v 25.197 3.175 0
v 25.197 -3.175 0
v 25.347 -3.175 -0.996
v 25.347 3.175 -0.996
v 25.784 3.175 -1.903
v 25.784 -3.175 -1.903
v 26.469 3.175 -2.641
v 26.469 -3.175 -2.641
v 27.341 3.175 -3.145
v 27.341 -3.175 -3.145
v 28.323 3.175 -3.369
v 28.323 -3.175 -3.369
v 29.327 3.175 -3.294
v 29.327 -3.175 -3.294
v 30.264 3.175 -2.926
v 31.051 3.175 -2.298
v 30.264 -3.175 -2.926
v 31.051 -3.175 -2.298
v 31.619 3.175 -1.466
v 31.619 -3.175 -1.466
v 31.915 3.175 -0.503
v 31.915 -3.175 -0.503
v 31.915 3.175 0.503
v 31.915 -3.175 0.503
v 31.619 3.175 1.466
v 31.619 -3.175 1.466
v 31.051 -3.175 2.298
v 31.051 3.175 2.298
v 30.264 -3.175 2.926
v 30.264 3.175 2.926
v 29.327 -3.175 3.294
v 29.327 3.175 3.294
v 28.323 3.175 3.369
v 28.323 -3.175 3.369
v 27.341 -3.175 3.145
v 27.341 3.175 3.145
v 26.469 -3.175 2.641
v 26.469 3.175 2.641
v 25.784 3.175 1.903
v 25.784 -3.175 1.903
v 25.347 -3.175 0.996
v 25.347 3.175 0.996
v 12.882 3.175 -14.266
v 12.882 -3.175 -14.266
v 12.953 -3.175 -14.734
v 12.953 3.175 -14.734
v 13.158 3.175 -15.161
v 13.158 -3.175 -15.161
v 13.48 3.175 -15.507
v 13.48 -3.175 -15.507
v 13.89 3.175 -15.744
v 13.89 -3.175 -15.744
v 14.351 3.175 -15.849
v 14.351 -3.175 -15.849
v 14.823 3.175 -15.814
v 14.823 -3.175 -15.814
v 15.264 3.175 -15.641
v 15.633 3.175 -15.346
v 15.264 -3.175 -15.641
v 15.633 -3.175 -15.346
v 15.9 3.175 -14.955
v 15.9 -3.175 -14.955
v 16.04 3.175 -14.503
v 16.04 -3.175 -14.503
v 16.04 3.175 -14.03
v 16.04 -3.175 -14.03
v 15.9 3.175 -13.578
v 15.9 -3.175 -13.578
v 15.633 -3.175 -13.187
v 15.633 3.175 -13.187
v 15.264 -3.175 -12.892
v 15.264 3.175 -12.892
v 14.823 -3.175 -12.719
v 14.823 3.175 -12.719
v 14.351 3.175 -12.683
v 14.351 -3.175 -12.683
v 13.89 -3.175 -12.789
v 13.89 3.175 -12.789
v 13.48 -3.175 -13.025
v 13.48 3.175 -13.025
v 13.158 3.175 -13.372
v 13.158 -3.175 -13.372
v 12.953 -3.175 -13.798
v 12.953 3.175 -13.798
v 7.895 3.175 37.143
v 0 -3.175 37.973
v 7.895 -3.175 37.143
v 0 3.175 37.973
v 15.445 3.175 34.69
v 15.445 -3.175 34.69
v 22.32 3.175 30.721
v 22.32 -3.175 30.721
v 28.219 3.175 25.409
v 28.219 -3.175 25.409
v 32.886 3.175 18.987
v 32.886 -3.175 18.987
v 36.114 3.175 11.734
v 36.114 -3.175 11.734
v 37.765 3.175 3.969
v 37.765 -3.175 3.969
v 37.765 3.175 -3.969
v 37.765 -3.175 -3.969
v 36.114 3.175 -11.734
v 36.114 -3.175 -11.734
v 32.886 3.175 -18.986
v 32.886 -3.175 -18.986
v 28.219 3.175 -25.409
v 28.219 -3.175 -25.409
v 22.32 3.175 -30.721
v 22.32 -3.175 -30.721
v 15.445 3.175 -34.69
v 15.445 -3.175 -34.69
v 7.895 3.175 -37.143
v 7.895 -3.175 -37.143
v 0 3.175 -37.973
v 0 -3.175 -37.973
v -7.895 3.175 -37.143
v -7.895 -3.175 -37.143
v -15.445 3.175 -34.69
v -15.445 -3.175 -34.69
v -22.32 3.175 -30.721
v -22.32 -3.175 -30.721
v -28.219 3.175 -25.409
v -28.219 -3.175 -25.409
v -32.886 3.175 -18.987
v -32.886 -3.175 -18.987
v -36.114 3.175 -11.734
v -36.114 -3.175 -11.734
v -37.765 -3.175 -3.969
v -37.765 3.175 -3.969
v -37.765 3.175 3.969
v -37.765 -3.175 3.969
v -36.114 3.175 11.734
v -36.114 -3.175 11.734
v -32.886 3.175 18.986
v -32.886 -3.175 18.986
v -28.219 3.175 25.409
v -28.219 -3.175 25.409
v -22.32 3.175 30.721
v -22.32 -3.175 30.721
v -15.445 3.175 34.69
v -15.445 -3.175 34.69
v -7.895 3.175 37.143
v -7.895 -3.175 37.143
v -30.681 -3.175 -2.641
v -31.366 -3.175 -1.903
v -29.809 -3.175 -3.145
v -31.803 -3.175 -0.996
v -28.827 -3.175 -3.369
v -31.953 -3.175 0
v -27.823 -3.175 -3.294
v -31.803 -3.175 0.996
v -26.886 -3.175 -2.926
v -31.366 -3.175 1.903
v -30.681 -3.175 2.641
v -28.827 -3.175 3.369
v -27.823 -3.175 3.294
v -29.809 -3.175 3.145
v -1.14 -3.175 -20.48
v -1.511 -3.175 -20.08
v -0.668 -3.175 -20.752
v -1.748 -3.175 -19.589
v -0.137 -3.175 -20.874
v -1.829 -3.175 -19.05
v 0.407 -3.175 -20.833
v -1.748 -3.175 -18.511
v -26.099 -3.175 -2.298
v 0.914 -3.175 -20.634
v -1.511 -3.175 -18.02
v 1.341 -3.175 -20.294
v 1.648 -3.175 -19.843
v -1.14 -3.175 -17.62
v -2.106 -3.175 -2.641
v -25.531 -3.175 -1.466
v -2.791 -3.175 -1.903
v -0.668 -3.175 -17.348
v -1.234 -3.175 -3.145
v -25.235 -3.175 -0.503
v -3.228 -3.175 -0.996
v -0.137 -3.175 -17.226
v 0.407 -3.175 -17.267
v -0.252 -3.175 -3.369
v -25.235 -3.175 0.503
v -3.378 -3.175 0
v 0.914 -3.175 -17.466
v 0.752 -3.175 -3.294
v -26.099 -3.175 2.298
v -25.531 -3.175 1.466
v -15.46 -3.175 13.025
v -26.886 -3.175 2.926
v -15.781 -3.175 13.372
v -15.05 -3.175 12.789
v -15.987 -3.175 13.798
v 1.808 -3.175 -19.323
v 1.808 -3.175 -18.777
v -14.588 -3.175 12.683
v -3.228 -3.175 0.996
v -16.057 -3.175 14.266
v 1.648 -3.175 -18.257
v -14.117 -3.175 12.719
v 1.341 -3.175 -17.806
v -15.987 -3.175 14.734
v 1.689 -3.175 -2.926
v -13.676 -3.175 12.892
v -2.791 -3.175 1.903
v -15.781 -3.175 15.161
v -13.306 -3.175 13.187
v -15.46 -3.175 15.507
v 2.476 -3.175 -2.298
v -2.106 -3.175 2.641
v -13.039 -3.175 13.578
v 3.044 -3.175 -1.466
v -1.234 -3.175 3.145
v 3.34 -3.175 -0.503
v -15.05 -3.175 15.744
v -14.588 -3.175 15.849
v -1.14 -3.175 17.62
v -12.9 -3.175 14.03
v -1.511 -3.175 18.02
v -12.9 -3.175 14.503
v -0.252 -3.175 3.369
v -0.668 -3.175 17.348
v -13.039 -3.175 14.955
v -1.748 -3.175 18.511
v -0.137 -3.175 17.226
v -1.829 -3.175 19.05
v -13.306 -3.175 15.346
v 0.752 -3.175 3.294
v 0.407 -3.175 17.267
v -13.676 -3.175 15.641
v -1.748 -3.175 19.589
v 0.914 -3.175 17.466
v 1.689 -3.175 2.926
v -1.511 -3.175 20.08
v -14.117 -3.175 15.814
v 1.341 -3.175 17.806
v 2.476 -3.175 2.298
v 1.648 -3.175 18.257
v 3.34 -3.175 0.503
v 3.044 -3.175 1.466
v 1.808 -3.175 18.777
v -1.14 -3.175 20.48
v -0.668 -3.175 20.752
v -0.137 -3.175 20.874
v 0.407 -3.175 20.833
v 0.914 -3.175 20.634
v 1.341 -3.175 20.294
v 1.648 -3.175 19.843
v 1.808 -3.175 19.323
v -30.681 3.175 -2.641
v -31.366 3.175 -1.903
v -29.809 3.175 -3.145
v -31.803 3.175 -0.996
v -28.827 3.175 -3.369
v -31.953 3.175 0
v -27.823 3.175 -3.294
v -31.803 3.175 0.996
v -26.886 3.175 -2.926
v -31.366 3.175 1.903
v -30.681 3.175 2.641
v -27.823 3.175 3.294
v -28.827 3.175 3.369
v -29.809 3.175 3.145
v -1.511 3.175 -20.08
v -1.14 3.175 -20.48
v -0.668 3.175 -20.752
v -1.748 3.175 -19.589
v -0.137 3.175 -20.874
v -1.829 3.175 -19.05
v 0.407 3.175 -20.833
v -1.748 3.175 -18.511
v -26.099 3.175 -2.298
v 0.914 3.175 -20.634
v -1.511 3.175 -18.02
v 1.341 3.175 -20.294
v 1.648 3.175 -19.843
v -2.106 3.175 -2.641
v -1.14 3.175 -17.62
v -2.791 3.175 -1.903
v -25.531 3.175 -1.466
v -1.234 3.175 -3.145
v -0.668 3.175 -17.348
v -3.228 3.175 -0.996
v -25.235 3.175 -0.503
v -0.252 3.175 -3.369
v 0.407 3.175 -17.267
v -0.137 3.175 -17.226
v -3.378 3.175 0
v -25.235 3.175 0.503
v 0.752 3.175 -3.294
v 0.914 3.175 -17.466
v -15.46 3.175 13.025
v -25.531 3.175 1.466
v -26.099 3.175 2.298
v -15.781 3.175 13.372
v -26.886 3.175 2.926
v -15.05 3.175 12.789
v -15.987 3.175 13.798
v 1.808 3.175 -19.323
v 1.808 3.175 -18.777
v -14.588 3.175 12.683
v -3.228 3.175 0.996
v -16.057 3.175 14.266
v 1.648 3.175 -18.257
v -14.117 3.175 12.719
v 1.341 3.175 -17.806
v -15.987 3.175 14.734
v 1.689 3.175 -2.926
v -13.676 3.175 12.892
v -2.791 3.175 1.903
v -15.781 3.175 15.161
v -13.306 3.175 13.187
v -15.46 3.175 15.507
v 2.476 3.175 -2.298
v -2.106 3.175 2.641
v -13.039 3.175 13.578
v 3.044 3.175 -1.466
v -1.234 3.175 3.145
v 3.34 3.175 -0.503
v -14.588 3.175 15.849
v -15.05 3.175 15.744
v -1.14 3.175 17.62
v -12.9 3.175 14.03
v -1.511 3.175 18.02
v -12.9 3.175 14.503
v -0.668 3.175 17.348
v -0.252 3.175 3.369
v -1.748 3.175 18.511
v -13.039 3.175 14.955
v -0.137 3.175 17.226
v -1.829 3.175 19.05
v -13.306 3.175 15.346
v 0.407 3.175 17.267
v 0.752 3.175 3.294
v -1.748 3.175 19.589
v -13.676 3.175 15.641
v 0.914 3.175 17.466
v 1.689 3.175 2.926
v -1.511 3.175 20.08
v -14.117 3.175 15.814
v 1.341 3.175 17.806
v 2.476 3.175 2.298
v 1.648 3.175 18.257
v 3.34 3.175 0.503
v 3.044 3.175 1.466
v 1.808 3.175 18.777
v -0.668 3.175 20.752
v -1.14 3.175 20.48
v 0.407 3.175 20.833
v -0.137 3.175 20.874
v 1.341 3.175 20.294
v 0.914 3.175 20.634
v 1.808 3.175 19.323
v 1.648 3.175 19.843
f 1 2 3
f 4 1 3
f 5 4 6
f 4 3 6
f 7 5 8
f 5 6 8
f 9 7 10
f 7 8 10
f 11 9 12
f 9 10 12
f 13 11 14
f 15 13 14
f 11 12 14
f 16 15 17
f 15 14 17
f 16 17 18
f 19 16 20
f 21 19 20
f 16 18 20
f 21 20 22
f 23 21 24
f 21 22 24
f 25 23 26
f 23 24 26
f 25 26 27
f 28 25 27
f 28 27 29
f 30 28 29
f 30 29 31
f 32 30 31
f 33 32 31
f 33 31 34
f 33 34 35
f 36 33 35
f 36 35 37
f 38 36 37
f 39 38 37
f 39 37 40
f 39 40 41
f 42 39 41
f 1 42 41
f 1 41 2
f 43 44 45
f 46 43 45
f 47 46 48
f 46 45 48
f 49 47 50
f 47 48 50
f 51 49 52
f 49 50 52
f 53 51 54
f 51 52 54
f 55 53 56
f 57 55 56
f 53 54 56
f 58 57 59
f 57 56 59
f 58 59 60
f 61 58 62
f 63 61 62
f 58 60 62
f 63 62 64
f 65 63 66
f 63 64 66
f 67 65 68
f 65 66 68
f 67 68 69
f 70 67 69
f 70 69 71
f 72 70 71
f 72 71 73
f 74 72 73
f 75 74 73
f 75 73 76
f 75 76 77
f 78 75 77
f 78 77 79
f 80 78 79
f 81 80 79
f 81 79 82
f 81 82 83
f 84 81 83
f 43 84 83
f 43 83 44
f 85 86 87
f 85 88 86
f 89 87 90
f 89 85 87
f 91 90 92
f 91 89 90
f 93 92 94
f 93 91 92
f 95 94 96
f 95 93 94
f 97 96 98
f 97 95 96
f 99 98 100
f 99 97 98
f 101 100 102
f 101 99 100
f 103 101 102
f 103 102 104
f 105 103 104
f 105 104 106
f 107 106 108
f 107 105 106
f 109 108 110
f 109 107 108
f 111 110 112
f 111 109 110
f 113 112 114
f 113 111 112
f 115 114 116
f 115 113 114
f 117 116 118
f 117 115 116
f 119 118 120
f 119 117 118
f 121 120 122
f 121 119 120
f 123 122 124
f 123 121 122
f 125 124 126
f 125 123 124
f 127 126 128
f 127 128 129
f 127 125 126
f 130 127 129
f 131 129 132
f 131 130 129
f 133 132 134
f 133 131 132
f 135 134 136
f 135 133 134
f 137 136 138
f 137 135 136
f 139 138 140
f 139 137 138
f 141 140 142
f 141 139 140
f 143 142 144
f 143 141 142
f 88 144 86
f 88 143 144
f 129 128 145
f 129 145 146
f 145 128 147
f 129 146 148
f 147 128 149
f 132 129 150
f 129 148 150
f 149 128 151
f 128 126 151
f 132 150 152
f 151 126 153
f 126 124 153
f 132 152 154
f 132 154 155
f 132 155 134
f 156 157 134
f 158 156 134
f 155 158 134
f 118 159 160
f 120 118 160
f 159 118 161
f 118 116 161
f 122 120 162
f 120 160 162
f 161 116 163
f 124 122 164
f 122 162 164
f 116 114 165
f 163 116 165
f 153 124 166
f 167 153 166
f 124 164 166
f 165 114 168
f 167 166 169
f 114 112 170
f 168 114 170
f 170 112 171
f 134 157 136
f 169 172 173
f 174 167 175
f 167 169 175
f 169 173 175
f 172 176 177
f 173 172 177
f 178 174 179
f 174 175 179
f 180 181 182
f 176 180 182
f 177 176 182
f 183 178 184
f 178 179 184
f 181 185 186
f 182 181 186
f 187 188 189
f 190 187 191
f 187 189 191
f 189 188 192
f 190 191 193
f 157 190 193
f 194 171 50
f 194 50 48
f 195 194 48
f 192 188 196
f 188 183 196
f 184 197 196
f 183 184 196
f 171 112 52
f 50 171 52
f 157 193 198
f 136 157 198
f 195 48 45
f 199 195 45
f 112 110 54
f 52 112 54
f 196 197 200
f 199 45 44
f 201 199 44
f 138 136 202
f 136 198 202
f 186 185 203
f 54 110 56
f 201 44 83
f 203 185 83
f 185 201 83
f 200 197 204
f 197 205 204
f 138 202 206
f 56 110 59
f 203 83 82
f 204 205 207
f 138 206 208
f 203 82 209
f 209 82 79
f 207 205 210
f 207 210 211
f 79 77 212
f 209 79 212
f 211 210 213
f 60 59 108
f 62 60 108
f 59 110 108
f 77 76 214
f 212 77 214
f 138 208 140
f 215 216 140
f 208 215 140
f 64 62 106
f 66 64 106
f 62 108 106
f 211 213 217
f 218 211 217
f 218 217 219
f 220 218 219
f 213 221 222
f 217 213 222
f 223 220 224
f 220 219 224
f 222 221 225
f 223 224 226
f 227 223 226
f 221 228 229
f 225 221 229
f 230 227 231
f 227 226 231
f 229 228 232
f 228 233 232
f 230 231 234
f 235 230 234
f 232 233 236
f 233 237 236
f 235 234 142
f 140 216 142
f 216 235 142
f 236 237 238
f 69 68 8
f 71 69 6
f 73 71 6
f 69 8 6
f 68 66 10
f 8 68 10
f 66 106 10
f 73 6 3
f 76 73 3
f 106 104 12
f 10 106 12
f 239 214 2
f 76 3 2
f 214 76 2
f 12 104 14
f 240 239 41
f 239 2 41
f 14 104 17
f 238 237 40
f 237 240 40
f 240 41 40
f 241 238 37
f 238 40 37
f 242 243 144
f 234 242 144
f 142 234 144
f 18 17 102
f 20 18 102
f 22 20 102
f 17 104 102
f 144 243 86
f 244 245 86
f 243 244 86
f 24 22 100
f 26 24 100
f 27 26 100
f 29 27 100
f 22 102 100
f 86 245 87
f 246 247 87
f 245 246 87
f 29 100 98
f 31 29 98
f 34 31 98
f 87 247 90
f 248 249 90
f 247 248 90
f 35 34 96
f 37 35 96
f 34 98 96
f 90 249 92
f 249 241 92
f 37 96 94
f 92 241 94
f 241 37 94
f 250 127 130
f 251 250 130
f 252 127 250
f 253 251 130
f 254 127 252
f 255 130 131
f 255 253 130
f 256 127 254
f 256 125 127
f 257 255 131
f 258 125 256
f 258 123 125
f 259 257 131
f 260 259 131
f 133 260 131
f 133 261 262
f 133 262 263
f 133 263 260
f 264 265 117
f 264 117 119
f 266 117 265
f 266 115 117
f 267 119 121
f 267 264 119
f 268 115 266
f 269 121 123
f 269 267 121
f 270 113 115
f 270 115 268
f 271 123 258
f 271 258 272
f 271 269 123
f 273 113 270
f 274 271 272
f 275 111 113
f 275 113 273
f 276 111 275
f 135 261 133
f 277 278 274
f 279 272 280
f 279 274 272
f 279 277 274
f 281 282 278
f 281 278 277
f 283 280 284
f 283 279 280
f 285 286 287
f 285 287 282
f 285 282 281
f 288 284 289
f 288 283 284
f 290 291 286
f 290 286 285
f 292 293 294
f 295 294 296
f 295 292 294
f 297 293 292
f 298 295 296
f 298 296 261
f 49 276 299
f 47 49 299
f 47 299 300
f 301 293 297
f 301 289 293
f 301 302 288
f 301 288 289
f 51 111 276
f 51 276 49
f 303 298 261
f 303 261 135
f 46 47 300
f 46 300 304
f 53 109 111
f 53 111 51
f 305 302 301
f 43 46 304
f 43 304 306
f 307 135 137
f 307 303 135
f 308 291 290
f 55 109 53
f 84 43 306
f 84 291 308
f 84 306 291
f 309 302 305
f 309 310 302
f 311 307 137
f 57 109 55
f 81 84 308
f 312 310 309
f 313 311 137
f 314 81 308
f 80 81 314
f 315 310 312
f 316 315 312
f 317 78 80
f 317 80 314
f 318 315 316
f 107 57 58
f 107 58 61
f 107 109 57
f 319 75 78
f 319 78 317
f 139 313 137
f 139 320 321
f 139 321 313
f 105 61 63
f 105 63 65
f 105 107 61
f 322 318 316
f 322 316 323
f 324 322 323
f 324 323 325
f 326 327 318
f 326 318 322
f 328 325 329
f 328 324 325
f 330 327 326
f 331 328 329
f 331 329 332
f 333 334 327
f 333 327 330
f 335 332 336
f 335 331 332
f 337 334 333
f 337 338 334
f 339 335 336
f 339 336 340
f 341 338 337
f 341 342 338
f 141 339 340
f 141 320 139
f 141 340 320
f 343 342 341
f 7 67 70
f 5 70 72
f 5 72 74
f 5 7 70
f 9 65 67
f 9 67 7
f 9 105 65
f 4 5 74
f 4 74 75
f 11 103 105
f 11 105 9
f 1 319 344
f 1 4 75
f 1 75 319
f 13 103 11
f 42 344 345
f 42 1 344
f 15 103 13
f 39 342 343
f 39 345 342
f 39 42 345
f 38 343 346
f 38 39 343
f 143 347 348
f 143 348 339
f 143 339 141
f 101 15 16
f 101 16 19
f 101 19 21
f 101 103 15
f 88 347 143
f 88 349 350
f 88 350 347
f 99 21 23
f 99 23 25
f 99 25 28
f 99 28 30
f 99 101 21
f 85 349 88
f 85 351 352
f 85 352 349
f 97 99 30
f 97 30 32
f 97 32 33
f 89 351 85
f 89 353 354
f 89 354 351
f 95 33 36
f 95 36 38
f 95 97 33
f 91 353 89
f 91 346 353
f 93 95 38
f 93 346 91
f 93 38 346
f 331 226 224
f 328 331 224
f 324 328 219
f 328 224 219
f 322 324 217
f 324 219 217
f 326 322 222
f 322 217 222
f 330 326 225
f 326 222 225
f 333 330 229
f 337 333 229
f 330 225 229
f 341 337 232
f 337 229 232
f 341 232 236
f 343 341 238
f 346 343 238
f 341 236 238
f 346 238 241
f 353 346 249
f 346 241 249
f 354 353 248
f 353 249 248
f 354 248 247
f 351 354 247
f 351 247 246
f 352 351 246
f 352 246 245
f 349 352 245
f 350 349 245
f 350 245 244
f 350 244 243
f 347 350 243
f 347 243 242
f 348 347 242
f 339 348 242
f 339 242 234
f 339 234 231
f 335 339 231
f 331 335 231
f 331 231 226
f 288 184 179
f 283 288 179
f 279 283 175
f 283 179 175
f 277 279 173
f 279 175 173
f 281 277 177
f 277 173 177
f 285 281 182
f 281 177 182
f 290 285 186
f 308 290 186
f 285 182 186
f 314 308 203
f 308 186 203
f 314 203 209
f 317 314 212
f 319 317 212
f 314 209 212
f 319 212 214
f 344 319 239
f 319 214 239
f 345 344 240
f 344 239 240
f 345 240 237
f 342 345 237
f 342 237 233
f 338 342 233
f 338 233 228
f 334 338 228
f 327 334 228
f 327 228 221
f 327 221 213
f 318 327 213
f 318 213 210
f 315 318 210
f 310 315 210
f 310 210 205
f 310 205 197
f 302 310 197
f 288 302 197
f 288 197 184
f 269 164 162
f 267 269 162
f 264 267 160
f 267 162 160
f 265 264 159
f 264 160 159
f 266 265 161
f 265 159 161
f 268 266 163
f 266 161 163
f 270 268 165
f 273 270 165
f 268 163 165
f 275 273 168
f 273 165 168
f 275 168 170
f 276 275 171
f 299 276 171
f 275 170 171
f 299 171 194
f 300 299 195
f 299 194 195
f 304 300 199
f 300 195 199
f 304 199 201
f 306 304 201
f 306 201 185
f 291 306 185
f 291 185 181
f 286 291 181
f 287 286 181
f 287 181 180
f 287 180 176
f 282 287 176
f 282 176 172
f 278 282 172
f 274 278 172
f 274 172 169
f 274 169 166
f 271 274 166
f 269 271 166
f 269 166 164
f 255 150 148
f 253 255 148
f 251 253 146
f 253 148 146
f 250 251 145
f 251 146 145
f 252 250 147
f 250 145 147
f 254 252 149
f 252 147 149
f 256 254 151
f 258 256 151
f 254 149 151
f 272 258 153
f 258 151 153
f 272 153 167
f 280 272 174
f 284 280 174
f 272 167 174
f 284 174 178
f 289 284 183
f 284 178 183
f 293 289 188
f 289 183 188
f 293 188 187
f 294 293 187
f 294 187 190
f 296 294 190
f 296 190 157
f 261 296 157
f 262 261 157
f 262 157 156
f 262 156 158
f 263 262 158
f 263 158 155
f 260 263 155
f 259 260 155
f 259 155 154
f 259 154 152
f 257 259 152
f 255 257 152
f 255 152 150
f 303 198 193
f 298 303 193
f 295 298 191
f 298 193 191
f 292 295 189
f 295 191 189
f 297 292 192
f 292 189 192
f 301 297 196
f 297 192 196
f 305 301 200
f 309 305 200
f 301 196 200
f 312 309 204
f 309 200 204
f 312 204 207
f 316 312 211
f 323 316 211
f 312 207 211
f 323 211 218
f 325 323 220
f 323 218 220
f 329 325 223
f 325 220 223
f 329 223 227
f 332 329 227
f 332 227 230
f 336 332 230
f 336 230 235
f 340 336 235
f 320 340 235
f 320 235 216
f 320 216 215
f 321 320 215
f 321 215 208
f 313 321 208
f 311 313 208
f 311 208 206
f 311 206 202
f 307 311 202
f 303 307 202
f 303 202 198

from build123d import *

# Parameters (mm, degrees)
SKETCH1_R                    = 37.973
BOSS_EXTRUDE1_DEPTH          = 3.175
H_0_266_DIAMETER_HOLE1_D     = 6.7564
F_27_0_144_DIAMETER_HOLE1_D  = 3.6576
F_1_8_0_125_DIAMETER_HOLE1_D = 3.175
H_0_266_DIAMETER_HOLE2_D     = 6.7564


with BuildPart() as part:
    # Sketch1 → Boss-Extrude1 (new, symmetric)
    with BuildSketch(Plane(origin=(0, 0, 0), x_dir=(1, 0, 0), z_dir=(0, 1, 0))):
        with Locations(Location((0, 0, 0), (0, 0, 270))):
            Circle(SKETCH1_R)
    extrude(amount=BOSS_EXTRUDE1_DEPTH, both=True)

    # H (0.266) Diameter Hole1 (through all)
    with Locations(Plane(origin=(0, 3.175, 0), x_dir=(1, 0, 0), z_dir=(0, 1, 0))):
        with Locations((-28.575, 0), (28.575, 0)):
            Hole(H_0_266_DIAMETER_HOLE1_D / 2)

    # #27 (0.144) Diameter Hole1 (through all)
    with Locations(Plane(origin=(0, 3.175, 0), x_dir=(1, 0, 0), z_dir=(0, 1, 0))):
        with Locations((0, 19.05), (0, -19.05)):
            Hole(F_27_0_144_DIAMETER_HOLE1_D / 2)

    # 1/8 (0.125) Diameter Hole1 (through all)
    with Locations(Plane(origin=(0, 3.175, 0), x_dir=(1, 0, 0), z_dir=(0, 1, 0))):
        with Locations((14.469766177, 14.266333333), (-14.469766177, -14.266333333)):
            Hole(F_1_8_0_125_DIAMETER_HOLE1_D / 2)

    # H (0.266) Diameter Hole2 (through all)
    with Locations(Plane(origin=(0, 3.175, 0), x_dir=(1, 0, 0), z_dir=(0, 1, 0))):
        with Locations((0, 0)):
            Hole(H_0_266_DIAMETER_HOLE2_D / 2)


solid = part.part
